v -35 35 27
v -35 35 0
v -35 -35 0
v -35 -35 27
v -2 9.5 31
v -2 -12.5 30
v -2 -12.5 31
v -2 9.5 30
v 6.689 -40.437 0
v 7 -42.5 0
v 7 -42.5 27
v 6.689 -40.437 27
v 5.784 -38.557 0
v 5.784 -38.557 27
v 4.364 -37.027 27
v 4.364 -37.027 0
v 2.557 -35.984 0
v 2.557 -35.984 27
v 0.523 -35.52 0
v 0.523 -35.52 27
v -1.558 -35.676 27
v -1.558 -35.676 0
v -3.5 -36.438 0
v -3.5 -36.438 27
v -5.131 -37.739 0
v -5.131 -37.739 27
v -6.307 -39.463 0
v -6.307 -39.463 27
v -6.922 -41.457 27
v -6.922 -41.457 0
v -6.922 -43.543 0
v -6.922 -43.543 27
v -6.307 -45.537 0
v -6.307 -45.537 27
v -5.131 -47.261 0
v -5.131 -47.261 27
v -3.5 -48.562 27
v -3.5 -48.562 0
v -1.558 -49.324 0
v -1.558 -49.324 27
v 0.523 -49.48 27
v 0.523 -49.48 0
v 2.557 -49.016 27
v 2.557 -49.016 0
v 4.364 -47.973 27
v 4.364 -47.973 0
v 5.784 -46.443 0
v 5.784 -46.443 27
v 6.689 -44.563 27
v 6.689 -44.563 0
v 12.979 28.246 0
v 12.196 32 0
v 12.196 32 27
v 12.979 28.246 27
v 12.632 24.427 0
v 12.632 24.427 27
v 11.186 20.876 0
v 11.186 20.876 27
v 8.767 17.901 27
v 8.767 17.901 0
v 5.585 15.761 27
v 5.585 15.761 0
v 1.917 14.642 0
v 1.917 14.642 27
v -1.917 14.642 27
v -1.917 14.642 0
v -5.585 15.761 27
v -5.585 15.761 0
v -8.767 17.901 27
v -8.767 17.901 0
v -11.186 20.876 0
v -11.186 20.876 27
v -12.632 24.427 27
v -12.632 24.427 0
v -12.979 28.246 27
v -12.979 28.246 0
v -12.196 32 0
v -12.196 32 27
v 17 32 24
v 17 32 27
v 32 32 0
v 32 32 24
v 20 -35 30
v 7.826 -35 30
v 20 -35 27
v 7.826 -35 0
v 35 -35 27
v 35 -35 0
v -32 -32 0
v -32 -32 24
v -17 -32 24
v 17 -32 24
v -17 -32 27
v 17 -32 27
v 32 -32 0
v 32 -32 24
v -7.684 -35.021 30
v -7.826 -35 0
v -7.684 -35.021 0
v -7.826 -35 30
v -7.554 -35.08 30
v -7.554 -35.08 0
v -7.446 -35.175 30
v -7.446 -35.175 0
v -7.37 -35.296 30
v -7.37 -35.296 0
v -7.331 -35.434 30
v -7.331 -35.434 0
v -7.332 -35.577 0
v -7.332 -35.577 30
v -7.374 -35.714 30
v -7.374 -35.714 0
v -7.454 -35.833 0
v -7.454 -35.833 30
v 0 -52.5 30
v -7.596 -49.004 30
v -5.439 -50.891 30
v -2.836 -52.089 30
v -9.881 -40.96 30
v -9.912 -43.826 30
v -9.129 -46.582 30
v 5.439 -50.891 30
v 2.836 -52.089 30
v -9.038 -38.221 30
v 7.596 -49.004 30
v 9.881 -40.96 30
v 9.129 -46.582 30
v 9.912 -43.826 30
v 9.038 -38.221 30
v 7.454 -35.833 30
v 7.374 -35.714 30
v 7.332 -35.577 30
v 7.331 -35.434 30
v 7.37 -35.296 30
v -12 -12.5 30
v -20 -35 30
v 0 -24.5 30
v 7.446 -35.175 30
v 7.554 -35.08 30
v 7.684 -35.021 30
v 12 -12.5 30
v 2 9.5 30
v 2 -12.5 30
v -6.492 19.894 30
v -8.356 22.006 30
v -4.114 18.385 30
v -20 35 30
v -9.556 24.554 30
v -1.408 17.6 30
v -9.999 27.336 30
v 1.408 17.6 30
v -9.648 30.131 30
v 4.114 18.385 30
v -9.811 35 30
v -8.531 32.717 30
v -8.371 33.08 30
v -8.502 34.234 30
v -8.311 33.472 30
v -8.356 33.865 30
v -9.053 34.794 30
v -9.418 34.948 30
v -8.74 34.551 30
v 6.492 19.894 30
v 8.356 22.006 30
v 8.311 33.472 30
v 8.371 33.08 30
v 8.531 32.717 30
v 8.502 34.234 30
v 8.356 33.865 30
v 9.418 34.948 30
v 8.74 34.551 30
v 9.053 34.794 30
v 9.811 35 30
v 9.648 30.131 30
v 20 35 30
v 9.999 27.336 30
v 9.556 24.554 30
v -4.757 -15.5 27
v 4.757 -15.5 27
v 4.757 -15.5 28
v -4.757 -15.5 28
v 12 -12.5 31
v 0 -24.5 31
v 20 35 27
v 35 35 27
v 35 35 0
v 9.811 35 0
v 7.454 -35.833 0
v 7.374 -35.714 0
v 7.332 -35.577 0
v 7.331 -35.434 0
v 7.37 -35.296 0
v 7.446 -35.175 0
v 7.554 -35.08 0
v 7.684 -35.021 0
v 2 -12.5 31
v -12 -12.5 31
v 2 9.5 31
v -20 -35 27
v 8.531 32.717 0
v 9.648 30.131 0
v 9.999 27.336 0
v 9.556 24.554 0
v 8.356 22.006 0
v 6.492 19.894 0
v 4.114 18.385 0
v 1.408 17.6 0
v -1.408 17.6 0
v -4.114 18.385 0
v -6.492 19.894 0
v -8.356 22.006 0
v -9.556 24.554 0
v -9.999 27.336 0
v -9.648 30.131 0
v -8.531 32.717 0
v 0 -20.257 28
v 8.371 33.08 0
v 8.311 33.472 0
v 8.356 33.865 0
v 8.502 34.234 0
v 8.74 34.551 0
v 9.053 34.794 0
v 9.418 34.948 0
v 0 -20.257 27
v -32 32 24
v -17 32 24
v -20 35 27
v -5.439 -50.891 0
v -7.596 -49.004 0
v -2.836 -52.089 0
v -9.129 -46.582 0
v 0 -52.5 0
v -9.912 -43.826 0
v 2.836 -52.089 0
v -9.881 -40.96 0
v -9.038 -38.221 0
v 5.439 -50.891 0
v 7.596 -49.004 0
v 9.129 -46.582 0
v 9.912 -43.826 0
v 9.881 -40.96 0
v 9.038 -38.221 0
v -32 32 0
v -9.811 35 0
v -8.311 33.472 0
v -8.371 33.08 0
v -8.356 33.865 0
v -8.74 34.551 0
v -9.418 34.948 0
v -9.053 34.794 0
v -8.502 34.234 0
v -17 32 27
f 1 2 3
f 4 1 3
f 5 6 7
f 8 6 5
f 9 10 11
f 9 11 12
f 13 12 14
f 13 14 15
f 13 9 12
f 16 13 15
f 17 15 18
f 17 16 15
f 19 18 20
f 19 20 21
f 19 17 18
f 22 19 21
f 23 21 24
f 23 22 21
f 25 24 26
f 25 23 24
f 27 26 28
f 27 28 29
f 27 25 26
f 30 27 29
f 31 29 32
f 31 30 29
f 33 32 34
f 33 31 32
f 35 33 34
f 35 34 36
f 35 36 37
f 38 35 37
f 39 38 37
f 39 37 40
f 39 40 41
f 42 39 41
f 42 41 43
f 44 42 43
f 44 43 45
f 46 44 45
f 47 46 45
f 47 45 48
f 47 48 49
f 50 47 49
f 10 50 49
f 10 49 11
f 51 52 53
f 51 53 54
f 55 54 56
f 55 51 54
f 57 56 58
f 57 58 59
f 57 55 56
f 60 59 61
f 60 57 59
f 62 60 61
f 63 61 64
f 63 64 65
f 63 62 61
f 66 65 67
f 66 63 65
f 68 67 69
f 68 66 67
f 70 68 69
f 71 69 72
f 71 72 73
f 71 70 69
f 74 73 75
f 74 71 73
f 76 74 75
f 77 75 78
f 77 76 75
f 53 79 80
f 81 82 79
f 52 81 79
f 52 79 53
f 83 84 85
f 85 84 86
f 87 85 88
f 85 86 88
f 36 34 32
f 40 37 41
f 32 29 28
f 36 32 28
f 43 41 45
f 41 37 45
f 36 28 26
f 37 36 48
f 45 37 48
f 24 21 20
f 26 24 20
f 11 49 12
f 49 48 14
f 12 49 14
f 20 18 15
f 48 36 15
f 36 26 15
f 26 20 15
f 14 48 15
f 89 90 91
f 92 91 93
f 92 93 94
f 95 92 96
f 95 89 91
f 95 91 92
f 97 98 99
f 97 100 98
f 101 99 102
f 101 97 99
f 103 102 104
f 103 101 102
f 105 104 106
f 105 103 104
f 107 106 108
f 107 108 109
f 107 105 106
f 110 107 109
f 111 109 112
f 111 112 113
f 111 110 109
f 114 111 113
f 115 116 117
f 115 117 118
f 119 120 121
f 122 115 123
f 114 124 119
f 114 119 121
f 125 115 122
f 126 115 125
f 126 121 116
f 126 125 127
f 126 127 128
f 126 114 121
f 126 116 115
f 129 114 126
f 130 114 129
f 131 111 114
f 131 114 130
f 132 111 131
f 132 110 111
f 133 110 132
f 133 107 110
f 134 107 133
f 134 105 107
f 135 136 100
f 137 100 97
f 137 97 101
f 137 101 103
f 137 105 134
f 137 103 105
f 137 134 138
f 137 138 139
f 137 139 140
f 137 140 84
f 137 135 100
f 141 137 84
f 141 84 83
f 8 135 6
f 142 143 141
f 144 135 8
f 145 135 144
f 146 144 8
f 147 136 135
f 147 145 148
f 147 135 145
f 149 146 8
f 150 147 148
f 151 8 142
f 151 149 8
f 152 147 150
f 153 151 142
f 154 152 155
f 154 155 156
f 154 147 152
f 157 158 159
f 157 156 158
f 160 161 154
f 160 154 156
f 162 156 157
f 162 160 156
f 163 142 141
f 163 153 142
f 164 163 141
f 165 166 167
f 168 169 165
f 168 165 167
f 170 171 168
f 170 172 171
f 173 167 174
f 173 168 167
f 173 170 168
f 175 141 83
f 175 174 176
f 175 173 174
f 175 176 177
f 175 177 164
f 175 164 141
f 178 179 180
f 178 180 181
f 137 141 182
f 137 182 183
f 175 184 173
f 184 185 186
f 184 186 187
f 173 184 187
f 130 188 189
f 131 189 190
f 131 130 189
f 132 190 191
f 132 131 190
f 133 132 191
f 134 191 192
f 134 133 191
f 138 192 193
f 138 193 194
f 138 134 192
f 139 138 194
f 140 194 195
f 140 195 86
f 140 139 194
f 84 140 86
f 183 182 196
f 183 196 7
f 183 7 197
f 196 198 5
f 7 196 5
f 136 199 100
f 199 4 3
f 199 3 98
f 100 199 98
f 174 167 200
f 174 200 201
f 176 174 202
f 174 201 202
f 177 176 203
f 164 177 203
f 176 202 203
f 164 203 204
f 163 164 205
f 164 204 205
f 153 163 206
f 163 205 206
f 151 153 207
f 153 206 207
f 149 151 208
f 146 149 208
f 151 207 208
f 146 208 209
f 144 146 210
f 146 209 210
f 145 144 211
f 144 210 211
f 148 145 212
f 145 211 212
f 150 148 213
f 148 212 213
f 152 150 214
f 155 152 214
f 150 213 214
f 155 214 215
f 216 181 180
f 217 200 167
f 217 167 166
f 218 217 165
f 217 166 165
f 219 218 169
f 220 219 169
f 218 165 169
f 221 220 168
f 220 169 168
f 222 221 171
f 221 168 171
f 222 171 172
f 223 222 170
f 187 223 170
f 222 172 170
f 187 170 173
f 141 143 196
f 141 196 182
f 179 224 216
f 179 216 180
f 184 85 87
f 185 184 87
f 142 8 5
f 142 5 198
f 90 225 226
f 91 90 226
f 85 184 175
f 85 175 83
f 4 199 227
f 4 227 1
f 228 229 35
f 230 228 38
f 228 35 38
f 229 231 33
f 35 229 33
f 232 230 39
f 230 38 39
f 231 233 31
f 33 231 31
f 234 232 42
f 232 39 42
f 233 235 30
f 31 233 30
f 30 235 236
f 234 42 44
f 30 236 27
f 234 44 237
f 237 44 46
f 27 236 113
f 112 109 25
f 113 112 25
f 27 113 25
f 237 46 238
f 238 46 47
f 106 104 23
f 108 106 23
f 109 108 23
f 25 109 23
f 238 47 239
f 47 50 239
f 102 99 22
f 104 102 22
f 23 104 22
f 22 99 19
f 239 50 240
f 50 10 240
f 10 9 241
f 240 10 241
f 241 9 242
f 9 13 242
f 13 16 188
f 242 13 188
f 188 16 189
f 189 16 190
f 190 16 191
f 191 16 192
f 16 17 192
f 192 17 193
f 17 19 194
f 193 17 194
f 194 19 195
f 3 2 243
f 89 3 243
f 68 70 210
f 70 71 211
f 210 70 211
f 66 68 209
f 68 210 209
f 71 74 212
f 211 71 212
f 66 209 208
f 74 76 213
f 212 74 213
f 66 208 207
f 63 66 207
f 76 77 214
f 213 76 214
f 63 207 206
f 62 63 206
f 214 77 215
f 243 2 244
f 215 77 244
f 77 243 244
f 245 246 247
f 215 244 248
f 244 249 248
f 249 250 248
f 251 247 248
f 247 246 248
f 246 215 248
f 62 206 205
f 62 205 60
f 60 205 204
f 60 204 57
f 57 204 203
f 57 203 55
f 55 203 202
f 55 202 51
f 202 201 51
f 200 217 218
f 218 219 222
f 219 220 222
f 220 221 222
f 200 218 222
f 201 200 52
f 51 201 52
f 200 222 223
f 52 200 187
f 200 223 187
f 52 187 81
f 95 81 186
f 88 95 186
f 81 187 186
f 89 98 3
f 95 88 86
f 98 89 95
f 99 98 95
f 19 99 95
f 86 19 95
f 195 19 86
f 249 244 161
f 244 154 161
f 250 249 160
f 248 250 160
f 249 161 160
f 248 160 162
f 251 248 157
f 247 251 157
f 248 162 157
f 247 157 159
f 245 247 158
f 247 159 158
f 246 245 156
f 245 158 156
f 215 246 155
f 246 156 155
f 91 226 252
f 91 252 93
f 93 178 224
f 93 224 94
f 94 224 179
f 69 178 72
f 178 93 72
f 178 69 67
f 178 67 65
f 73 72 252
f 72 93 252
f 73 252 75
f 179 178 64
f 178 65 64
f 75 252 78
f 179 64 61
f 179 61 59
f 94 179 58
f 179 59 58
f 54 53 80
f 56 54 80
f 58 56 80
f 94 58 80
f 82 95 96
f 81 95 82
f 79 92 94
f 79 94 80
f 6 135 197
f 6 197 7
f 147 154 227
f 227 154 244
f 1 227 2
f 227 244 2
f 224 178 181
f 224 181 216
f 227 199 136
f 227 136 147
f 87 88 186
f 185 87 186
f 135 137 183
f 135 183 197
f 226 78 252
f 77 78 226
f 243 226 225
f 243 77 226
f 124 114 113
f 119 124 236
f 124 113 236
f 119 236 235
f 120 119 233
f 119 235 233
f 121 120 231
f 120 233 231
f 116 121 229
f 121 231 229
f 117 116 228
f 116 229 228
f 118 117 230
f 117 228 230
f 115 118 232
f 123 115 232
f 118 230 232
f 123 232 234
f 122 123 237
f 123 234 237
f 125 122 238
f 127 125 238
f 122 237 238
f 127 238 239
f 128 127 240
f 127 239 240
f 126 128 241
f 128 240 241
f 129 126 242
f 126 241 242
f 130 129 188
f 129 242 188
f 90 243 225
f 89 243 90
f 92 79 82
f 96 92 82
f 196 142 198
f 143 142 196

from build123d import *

# Parameters (mm, degrees)
BOSS_EXTRU_1_DEPTH           = 30
BOSS_EXTRU_2_DEPTH           = 1
ENL_V_MAT_EXTRU_2_DEPTH      = 70.865943062
ENL_V_MAT_EXTRU_2_DEPTH_BACK = 3
ENL_V_MAT_EXTRU_3_DEPTH      = 70.865943062
ENL_V_MAT_EXTRU_3_DEPTH_BACK = 3
COQUE3_OUTLINE_R             = 7
COQUE3_DEPTH                 = 24
COQUE3_START                 = 24
COQUE3_2_OUTLINE_R           = 7
COQUE3_2_DEPTH               = 3
COQUE3_START_2               = 27
COQUE3_3_DEPTH               = 1
CONG_1_R                     = 0.5
CONG_2_R                     = 1.5


# Read off the part's stored shape, not the designer's step: Coque3
with BuildPart() as part:
    # Esquisse1 → Boss.-Extru.1 (new body)
    with BuildSketch(Plane.XY):
        with BuildLine():
            Line((-35, -35), (-6.614378278, -35))
            ThreePointArc((-6.614378278, -35), (0, -52.5), (6.614378278, -35))
            Line((6.614378278, -35), (35, -35))
            Line((35, -35), (35, 35))
            Line((35, 35), (6.614378278, 35))
            ThreePointArc((6.614378278, 35), (0, 17.5), (-6.614378278, 35))
            Line((-6.614378278, 35), (-35, 35))
            Line((-35, 35), (-35, -35))
        make_face()
    extrude(amount=BOSS_EXTRU_1_DEPTH)

    # Esquisse4 → Boss.-Extru.2 (add)
    with BuildSketch(Plane.XY.offset(30)):
        Polygon((0, -24.5), (-12, -12.5), (-2, -12.5), (-2, 9.5), (2, 9.5), (2, -12.5), (12, -12.5), align=None)
    extrude(amount=BOSS_EXTRU_2_DEPTH)

    # Esquisse5 → Enlèv. mat.-Extru.2 (cut, two sides: drawn at the far end of the back side and taken through both)
    with BuildSketch(Plane.XY.offset(30).offset(-ENL_V_MAT_EXTRU_2_DEPTH_BACK)):
        Polygon((20, 251.700266086), (20, 35), (20, -35), (20, -251.700266086), (453.400532172, -251.700266086), (453.400532172, 251.700266086), align=None)
    extrude(amount=ENL_V_MAT_EXTRU_2_DEPTH + ENL_V_MAT_EXTRU_2_DEPTH_BACK, mode=Mode.SUBTRACT)

    # Esquisse6 → Enlèv. mat.-Extru.3 (cut, two sides: drawn at the far end of the back side and taken through both)
    with BuildSketch(Plane.XY.offset(30).offset(-ENL_V_MAT_EXTRU_3_DEPTH_BACK)):
        Polygon((-20, 251.700266086), (-20, 35), (-20, -35), (-20, -251.700266086), (-453.400532172, -251.700266086), (-453.400532172, 251.700266086), align=None)
    extrude(amount=ENL_V_MAT_EXTRU_3_DEPTH + ENL_V_MAT_EXTRU_3_DEPTH_BACK, mode=Mode.SUBTRACT)

    # Coque3 outline → Coque3 (cut)
    with BuildSketch(Plane.XY):
        with Locations((0, -42.5)):
            Circle(COQUE3_OUTLINE_R)
        with BuildLine():
            Line((-32, -32), (32, -32))
            Line((32, -32), (32, 32))
            Line((32, 32), (12.196310918, 32))
            ThreePointArc((12.196310918, 32), (0, 14.5), (-12.196310918, 32))
            Line((-12.196310918, 32), (-32, 32))
            Line((-32, 32), (-32, -32))
        make_face()
    extrude(amount=COQUE3_DEPTH, mode=Mode.SUBTRACT)

    # Coque3 2 outline → Coque3 2 (cut)
    with BuildSketch(Plane.XY.offset(COQUE3_START)):
        with Locations((0, -42.5)):
            Circle(COQUE3_2_OUTLINE_R)
        with BuildLine():
            Line((-17, 32), (-17, -32))
            Line((-17, -32), (17, -32))
            Line((17, -32), (17, 32))
            Line((17, 32), (12.196310918, 32))
            ThreePointArc((12.196310918, 32), (0, 14.5), (-12.196310918, 32))
            Line((-12.196310918, 32), (-17, 32))
        make_face()
    extrude(amount=COQUE3_2_DEPTH, mode=Mode.SUBTRACT)

    # Coque3 3 outline → Coque3 3 (cut)
    with BuildSketch(Plane.XY.offset(COQUE3_START_2)):
        Polygon((4.757359313, -15.5), (-4.757359313, -15.5), (0, -20.257359313), align=None)
    extrude(amount=COQUE3_3_DEPTH, mode=Mode.SUBTRACT)

    # Congé1
    cong_1_edges = [part.edges().sort_by_distance(p)[0] for p in [
        (6.614378278, -35, 15),
        (-6.614378278, -35, 15),
    ]]
    fillet(cong_1_edges, radius=CONG_1_R)

    # Congé2
    cong_2_edges = [part.edges().sort_by_distance(p)[0] for p in [
        (-6.614378278, 35, 15),
        (6.614378278, 35, 15),
    ]]
    fillet(cong_2_edges, radius=CONG_2_R)


solid = part.part
